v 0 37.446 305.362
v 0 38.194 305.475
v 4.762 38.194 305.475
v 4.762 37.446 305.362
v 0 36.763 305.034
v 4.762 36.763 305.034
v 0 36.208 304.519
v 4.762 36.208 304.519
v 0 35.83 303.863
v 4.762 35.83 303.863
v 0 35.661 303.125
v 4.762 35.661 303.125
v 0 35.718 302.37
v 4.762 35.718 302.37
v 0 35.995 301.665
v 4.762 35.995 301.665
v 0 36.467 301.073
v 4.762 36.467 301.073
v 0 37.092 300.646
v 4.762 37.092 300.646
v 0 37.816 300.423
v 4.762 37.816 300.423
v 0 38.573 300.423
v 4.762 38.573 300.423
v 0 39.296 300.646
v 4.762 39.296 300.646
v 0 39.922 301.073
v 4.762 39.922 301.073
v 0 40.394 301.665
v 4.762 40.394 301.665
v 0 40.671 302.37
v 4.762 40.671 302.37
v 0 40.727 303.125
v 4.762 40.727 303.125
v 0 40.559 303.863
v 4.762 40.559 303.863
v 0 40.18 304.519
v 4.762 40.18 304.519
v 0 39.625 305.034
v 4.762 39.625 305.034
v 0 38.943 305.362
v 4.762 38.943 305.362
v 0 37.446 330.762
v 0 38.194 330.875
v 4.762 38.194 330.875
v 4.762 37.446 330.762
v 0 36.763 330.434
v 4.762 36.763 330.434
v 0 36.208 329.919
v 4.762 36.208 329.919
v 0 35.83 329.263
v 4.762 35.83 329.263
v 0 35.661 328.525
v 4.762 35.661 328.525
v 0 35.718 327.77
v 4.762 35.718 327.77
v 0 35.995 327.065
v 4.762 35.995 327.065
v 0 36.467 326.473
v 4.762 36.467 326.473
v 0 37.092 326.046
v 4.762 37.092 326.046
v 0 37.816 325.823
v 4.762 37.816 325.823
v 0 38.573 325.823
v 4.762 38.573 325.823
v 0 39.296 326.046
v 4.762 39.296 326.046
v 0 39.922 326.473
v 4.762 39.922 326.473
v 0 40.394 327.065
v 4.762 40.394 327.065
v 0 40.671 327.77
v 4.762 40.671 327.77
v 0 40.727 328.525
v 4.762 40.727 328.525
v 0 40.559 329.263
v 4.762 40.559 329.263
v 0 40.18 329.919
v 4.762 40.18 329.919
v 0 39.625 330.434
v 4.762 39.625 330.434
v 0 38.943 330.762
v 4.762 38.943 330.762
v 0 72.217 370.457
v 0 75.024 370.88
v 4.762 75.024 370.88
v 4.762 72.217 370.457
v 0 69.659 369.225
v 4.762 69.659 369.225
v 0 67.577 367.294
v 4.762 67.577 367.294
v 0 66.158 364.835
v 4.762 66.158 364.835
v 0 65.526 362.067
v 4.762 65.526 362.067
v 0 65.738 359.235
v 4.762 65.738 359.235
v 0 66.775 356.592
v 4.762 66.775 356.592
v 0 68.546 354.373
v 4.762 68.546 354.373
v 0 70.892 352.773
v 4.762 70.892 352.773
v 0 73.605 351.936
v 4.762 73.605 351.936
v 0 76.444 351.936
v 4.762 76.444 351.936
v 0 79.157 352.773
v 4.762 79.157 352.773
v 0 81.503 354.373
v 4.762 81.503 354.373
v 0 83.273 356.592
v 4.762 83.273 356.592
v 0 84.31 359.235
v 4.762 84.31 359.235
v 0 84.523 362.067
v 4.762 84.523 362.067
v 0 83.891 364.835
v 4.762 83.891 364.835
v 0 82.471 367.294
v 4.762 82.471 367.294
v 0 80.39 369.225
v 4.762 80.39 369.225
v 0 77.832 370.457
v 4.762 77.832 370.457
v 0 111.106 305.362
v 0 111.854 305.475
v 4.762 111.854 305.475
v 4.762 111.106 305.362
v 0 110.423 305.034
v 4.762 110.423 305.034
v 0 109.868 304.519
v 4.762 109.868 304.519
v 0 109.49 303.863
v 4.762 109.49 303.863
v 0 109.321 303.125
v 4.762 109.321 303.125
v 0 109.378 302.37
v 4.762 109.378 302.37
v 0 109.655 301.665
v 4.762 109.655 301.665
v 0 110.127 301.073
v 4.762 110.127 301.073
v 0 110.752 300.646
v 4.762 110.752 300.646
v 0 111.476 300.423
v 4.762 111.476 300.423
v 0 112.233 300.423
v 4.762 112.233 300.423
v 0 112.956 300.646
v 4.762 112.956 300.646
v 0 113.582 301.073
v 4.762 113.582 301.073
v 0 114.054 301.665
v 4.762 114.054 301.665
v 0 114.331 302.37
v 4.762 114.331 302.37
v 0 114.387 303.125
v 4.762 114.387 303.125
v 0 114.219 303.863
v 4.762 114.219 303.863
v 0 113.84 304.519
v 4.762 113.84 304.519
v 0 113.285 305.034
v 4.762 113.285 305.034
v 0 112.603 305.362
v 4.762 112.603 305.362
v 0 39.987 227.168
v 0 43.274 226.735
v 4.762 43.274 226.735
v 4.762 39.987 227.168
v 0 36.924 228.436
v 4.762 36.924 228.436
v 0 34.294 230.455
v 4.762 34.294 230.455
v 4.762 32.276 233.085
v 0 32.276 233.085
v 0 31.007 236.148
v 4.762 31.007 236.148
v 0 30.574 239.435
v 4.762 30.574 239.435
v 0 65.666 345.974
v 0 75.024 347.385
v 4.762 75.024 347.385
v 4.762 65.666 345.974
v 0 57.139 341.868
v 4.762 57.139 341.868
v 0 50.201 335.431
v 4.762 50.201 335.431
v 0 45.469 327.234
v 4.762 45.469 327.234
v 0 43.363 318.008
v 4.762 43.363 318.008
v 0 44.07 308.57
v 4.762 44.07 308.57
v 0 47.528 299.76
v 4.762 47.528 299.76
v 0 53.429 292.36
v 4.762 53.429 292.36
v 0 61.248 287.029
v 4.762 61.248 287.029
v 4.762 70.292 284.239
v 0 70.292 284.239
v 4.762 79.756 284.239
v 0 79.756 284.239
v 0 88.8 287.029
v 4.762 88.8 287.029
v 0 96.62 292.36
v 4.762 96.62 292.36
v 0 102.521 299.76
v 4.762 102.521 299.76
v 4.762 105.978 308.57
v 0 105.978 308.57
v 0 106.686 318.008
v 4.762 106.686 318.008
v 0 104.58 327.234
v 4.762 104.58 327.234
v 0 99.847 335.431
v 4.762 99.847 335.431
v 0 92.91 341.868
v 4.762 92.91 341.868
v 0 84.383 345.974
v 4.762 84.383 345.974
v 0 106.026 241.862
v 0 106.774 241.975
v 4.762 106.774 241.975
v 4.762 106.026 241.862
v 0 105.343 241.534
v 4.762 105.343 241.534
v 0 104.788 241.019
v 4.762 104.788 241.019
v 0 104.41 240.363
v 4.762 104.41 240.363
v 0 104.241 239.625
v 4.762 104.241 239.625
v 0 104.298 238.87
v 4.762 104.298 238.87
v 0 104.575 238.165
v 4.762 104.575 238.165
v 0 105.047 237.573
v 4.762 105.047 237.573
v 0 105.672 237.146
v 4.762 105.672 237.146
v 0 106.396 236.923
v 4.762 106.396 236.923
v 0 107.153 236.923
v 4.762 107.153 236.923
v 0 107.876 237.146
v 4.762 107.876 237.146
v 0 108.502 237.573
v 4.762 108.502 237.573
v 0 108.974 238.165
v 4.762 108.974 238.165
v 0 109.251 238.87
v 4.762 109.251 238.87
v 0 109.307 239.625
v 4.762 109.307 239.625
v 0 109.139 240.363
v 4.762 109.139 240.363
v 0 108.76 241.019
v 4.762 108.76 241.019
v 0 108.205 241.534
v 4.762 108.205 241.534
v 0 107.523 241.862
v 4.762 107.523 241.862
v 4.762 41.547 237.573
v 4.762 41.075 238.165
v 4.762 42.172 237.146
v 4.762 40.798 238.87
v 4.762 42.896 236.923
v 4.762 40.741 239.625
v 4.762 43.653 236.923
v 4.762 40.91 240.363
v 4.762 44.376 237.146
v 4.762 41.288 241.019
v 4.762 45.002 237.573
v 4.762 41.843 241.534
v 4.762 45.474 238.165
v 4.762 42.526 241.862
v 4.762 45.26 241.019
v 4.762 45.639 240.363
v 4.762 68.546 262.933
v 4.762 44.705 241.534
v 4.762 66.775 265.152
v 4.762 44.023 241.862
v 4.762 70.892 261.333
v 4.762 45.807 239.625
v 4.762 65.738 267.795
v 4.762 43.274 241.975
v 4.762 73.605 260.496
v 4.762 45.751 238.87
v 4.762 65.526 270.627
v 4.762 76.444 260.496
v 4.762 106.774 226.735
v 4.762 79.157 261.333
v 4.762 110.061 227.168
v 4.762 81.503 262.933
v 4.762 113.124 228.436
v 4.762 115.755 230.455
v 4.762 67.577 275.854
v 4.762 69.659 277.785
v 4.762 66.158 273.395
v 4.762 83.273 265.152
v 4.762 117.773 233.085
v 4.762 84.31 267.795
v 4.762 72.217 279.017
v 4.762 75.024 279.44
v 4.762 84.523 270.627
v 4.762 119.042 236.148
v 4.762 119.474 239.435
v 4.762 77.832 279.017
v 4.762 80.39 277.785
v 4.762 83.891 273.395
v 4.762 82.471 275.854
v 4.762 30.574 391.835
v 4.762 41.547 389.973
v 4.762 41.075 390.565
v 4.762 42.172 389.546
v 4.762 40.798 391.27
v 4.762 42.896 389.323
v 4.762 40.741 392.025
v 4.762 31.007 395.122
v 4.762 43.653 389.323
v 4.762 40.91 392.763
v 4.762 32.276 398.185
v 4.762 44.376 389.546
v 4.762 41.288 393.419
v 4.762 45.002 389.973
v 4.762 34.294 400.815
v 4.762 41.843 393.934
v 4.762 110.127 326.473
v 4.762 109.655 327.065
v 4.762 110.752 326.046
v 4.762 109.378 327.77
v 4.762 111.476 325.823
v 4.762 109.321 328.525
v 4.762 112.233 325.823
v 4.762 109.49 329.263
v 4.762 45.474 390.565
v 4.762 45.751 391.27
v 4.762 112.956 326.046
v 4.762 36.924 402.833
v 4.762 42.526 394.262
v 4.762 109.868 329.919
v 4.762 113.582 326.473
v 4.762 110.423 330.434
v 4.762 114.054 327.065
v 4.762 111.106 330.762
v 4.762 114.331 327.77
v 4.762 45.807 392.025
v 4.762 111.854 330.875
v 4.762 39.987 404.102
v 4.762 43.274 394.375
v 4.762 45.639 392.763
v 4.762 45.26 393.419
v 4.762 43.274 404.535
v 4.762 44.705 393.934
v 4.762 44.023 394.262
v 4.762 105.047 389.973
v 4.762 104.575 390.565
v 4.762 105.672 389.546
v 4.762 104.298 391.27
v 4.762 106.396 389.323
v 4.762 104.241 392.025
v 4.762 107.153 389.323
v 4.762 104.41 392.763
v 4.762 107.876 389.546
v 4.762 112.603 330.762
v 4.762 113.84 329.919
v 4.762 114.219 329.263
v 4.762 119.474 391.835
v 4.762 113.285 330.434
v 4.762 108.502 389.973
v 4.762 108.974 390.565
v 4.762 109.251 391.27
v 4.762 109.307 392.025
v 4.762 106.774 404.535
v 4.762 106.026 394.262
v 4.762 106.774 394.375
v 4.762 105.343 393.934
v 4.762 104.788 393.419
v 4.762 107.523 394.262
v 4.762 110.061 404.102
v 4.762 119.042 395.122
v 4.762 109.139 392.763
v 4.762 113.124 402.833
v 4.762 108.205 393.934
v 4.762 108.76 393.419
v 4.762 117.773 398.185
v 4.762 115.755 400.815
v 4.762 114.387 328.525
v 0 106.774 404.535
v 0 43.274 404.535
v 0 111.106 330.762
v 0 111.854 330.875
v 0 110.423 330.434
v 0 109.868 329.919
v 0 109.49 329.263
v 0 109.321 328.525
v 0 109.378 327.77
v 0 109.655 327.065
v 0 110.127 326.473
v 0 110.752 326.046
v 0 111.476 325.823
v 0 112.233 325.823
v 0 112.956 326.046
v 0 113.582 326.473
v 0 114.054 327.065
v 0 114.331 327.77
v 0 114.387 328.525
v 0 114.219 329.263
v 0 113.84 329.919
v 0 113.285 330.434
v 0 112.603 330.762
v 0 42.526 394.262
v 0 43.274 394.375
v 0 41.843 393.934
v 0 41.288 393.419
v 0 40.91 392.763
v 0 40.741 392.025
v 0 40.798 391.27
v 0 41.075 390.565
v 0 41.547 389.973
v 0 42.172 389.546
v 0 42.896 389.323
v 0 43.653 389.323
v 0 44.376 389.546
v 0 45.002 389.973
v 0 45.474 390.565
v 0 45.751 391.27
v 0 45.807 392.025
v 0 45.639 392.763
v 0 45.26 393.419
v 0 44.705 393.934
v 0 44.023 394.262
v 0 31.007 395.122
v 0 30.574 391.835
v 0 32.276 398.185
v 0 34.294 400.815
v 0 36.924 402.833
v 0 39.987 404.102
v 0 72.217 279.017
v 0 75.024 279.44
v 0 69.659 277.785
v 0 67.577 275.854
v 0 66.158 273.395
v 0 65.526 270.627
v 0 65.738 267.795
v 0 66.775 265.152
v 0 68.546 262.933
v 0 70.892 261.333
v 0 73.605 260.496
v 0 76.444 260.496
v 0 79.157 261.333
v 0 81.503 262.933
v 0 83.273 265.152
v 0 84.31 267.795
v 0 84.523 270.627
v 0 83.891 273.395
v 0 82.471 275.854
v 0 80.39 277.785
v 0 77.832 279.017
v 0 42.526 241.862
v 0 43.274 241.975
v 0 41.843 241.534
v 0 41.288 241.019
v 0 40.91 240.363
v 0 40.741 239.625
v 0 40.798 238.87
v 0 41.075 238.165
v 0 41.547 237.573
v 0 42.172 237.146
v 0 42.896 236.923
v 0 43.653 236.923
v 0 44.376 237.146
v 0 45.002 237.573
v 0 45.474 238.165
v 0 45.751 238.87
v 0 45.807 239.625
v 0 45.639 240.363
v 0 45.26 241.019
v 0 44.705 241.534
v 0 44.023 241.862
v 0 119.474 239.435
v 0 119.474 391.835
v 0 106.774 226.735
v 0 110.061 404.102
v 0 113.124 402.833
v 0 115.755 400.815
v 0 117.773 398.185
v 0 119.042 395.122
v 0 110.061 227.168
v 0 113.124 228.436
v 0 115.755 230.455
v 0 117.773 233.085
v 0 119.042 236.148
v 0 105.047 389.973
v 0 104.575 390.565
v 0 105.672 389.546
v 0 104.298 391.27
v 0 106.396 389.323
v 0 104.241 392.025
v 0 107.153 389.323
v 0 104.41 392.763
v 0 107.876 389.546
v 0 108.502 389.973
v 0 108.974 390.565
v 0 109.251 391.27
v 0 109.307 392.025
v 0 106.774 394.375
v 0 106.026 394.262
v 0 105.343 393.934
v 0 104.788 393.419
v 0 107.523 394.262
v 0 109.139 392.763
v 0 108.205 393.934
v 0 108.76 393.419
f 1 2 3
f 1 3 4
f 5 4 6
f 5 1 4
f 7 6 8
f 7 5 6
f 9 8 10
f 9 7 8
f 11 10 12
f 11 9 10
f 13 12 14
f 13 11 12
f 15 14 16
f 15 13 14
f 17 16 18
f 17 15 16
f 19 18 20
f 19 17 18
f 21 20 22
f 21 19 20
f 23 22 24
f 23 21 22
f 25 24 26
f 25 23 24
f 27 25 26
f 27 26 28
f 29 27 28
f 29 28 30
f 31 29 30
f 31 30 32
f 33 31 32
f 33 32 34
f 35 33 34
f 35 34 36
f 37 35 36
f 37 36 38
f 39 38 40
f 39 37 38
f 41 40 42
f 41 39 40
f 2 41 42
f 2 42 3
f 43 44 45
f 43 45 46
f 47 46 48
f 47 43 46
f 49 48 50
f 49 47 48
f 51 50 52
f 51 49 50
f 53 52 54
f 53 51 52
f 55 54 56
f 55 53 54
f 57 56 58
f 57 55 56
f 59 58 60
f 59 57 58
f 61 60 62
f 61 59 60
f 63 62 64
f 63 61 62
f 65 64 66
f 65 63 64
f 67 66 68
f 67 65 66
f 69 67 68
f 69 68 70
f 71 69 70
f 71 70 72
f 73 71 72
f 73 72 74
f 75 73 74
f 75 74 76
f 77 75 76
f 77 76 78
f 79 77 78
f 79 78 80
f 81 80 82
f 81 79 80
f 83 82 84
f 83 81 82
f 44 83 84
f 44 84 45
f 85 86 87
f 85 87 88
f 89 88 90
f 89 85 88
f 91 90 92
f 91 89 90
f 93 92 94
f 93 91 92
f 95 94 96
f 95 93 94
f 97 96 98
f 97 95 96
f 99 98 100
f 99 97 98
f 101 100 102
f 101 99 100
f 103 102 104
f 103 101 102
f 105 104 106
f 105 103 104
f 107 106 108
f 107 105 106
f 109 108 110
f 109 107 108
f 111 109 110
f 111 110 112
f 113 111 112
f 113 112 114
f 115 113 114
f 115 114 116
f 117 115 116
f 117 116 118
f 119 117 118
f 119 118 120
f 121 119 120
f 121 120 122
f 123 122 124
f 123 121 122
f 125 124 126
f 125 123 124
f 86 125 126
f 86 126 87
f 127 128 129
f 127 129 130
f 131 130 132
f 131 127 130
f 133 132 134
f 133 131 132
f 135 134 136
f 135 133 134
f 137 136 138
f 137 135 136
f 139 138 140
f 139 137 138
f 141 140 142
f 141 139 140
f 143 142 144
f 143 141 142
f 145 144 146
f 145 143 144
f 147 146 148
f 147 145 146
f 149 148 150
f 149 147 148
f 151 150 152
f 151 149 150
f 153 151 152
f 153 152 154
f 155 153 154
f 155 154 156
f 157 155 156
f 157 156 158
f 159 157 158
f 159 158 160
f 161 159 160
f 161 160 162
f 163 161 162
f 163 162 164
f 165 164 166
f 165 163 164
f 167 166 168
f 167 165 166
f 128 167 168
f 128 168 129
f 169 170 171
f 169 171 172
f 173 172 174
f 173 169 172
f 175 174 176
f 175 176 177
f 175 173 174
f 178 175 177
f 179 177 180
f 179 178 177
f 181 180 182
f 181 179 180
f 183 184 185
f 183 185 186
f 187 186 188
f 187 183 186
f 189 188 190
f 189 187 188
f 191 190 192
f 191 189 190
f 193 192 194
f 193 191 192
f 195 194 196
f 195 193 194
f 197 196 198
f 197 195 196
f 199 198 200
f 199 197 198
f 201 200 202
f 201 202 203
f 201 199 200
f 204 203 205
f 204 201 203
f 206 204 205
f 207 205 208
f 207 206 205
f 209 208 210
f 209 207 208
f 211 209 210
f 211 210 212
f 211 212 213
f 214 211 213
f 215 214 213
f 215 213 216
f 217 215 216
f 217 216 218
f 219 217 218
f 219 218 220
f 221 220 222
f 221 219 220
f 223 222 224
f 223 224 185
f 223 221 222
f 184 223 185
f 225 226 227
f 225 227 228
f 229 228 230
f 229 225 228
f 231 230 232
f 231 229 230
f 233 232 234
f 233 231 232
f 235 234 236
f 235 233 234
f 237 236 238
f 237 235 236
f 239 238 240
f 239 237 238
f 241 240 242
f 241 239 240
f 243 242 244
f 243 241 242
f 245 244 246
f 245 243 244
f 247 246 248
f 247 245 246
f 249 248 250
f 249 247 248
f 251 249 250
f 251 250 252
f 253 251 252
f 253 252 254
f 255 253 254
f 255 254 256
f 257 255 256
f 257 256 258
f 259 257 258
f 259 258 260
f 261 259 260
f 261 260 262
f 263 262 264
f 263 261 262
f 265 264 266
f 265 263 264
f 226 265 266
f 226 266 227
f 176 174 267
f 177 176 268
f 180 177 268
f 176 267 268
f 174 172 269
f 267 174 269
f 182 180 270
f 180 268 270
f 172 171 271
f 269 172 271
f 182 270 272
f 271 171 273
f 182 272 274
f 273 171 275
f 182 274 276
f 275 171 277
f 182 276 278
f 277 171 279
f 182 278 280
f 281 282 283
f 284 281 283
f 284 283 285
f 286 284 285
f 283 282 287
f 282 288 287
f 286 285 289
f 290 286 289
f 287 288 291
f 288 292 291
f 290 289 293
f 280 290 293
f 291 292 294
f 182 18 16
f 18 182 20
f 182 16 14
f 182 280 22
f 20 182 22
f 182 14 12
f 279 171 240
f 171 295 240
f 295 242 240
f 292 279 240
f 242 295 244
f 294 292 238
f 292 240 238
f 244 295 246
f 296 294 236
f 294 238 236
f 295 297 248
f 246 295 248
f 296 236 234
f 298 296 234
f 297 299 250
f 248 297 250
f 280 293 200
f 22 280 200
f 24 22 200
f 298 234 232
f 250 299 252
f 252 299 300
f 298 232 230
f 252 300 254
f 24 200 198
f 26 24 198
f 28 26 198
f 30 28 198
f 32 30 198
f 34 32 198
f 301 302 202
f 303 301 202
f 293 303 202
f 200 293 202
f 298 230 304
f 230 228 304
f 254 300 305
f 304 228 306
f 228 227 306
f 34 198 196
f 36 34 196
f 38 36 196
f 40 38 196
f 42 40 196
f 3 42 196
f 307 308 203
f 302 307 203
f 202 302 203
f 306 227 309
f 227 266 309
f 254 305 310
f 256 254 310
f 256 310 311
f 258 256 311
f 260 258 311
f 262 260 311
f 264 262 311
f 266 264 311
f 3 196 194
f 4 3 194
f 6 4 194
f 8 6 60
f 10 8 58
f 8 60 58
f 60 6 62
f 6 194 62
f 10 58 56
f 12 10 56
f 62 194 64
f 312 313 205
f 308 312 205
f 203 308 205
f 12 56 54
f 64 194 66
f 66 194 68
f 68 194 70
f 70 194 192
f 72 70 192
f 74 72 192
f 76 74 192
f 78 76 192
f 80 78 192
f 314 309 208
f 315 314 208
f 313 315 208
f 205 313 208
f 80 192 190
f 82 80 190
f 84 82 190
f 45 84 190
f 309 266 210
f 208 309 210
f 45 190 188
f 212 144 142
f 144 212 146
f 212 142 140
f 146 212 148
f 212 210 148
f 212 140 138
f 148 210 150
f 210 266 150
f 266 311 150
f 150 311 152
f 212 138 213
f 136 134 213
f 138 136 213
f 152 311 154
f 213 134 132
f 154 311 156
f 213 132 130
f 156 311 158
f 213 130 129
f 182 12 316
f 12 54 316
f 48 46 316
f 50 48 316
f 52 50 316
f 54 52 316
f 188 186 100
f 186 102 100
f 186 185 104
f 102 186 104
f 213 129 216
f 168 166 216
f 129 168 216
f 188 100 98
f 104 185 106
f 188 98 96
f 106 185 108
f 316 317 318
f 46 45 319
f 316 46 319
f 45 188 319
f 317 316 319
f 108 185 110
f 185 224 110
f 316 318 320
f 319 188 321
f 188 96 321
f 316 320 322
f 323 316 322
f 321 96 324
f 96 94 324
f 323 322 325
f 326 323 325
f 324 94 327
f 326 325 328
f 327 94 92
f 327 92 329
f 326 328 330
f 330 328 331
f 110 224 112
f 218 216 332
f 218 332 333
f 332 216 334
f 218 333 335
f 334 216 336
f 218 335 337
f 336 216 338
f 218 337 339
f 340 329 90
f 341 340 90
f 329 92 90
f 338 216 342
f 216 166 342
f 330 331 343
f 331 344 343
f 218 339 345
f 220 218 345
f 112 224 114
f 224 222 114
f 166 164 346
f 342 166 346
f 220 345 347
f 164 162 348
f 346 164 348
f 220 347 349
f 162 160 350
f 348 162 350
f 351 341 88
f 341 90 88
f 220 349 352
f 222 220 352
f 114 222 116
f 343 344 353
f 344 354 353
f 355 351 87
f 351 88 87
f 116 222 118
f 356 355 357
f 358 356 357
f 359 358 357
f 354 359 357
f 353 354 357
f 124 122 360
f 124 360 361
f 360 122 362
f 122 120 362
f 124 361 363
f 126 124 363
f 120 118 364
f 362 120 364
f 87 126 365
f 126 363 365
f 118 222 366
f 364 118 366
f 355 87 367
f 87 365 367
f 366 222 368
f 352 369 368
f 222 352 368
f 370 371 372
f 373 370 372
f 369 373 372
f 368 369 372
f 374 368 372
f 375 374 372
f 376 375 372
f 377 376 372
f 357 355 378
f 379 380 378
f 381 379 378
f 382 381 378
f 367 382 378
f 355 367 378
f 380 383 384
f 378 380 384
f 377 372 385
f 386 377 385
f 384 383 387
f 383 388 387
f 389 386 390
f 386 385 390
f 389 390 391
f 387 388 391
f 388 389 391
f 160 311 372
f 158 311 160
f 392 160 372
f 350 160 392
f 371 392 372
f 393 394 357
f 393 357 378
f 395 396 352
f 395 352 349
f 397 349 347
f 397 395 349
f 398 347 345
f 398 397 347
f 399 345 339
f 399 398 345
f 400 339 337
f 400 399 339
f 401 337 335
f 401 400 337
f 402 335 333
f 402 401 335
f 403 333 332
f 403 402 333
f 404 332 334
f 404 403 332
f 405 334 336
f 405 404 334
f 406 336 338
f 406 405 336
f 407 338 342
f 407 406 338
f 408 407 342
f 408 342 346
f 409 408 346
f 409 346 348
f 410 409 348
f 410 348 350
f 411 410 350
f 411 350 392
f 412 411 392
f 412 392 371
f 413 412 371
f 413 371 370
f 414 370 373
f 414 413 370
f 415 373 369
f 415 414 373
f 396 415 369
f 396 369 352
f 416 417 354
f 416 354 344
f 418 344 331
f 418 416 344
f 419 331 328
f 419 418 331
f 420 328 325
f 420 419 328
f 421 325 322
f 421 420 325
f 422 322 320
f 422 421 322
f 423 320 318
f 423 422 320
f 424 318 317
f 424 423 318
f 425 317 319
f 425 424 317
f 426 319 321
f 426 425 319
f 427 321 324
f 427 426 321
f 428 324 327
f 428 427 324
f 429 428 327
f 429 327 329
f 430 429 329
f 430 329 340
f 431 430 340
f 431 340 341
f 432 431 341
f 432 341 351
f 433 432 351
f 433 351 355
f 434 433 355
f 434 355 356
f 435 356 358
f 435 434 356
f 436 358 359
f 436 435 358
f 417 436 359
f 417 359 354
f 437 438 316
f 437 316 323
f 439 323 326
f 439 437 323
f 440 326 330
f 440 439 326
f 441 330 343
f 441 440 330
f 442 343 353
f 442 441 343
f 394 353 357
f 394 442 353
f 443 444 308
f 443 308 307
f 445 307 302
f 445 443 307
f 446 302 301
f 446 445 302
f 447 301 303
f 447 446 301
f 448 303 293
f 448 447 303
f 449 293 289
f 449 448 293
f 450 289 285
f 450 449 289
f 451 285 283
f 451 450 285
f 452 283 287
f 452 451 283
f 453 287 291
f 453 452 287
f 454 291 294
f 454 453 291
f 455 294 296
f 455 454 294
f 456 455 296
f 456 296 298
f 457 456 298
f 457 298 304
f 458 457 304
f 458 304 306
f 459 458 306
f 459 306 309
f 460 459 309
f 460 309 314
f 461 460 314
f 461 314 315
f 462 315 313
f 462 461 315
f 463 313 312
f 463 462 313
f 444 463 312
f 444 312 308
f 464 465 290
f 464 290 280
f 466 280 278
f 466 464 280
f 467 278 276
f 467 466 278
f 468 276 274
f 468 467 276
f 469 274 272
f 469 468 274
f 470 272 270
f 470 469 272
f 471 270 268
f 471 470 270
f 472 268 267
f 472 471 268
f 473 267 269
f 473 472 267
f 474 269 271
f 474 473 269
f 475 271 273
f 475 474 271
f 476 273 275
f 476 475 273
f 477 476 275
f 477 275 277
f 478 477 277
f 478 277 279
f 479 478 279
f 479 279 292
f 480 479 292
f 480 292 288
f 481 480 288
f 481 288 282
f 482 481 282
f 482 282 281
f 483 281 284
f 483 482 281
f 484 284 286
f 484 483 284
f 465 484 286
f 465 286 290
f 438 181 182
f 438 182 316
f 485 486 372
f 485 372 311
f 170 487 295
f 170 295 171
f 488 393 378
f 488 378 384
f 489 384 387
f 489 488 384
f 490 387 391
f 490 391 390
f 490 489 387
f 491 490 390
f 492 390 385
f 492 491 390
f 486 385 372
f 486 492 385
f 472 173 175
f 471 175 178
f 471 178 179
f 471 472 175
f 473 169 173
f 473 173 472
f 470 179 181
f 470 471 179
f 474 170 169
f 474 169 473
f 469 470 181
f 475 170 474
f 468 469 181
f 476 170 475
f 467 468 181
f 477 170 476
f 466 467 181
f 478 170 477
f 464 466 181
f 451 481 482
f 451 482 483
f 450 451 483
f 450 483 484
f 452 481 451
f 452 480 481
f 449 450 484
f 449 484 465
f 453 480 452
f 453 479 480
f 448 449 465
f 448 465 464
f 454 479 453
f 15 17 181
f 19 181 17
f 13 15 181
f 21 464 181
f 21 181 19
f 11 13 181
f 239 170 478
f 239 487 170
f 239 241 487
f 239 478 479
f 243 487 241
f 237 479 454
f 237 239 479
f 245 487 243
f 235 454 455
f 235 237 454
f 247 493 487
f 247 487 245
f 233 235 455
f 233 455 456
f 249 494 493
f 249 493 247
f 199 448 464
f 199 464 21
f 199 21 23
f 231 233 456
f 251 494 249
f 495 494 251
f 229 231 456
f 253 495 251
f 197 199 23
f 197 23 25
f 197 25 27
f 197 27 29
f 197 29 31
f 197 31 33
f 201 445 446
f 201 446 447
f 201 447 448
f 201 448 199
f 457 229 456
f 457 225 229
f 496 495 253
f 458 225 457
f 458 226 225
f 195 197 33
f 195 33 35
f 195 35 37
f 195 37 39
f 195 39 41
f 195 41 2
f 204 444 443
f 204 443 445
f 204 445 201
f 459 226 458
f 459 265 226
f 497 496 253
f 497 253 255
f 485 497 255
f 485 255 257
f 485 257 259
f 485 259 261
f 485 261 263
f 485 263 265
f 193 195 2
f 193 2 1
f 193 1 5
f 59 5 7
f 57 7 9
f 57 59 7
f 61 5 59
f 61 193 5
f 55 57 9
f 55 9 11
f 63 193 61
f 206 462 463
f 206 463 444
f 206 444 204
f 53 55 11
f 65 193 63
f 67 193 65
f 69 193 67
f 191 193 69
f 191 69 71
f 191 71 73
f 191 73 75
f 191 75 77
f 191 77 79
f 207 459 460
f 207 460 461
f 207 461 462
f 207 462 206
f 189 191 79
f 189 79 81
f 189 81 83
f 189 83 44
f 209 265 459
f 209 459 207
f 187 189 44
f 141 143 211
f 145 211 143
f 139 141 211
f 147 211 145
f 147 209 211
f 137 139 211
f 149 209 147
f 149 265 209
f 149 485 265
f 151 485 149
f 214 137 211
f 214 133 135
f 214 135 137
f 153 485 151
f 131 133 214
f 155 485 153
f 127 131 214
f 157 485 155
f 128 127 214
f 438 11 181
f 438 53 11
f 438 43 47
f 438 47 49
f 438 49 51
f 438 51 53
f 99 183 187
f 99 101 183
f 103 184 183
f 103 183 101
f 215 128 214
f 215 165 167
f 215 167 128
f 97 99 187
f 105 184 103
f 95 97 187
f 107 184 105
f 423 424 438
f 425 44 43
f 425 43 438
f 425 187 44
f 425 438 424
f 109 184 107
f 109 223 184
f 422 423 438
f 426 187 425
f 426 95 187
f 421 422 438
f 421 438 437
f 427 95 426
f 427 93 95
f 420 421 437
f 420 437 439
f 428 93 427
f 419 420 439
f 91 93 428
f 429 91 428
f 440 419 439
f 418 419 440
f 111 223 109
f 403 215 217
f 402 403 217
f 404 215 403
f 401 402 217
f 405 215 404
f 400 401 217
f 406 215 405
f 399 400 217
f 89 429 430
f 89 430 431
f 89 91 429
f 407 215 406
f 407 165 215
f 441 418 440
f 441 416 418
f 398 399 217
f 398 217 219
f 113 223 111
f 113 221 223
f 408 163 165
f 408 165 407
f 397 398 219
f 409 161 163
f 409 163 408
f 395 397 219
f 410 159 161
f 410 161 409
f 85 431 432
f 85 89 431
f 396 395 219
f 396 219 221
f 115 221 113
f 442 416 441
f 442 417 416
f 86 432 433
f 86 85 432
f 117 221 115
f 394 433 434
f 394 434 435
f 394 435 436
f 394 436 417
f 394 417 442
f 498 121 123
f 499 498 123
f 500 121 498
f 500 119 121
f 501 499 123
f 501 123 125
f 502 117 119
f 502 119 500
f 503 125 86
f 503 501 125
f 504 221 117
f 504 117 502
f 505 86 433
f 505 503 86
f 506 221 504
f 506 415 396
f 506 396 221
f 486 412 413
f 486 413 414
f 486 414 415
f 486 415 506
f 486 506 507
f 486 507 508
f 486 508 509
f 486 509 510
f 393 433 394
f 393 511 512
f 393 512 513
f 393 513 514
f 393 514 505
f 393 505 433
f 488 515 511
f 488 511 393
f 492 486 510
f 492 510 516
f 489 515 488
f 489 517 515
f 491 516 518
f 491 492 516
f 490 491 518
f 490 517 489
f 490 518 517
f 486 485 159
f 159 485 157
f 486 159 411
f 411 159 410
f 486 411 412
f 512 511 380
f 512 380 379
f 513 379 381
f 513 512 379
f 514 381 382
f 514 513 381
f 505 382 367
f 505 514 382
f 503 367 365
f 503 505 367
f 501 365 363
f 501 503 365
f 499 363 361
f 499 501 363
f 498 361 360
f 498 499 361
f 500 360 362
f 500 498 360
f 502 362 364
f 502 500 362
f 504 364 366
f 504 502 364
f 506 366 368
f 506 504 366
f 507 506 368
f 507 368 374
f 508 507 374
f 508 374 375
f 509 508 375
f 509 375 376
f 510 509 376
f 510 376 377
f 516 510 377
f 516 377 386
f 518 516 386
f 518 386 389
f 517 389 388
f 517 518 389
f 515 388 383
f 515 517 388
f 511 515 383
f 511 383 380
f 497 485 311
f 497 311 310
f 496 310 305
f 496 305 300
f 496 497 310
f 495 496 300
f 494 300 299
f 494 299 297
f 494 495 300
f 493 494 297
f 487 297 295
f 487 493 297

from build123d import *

# Parameters (mm, degrees)
SKETCH1_R           = 2.54
SKETCH1_R_2         = 31.75
SKETCH1_R_3         = 9.525
BOSS_EXTRUDE1_DEPTH = 4.7625


with BuildPart() as part:
    # Sketch1 → Boss-Extrude1 (new body)
    with BuildSketch(Plane(origin=(0, 0, 0), x_dir=(0, 0, -1), z_dir=(1, 0, 0))):
        with BuildLine():
            Line((226.734866781, 43.274288567), (226.734866781, 106.774288567))
            ThreePointArc((226.734866781, 106.774288567), (230.45461066, 115.754544688), (239.434866781, 119.474288567))
            Line((239.434866781, 119.474288567), (391.834866781, 119.474288567))
            ThreePointArc((391.834866781, 119.474288567), (400.815122902, 115.754544688), (404.534866781, 106.774288567))
            Line((404.534866781, 106.774288567), (404.534866781, 43.274288567))
            ThreePointArc((404.534866781, 43.274288567), (400.815122902, 34.294032445), (391.834866781, 30.574288567))
            Line((391.834866781, 30.574288567), (239.434866781, 30.574288567))
            ThreePointArc((239.434866781, 30.574288567), (230.45461066, 34.294032445), (226.734866781, 43.274288567))
        make_face()
        with Locations(Location((302.934866781, 111.854288567, 0), (0, 0, 180))):
            Circle(SKETCH1_R, mode=Mode.SUBTRACT)
        with Locations(Location((328.334866781, 111.854288567, 0), (0, 0, 180))):
            Circle(SKETCH1_R, mode=Mode.SUBTRACT)
        with Locations(Location((302.934866781, 38.194288567, 0), (0, 0, 180))):
            Circle(SKETCH1_R, mode=Mode.SUBTRACT)
        with Locations(Location((328.334866781, 38.194288567, 0), (0, 0, 180))):
            Circle(SKETCH1_R, mode=Mode.SUBTRACT)
        with Locations(Location((239.434866781, 43.274288567, 0), (0, 0, 180))):
            Circle(SKETCH1_R, mode=Mode.SUBTRACT)
        with Locations(Location((391.834866781, 43.274288567, 0), (0, 0, 180))):
            Circle(SKETCH1_R, mode=Mode.SUBTRACT)
        with Locations(Location((315.634866781, 75.024288567, 0), (0, 0, 180))):
            Circle(SKETCH1_R_2, mode=Mode.SUBTRACT)
        with Locations(Location((239.434866781, 106.774288567, 0), (0, 0, 180))):
            Circle(SKETCH1_R, mode=Mode.SUBTRACT)
        with Locations(Location((391.834866781, 106.774288567, 0), (0, 0, 180))):
            Circle(SKETCH1_R, mode=Mode.SUBTRACT)
        with Locations(Location((269.914866781, 75.024288567, 0), (0, 0, 180))):
            Circle(SKETCH1_R_3, mode=Mode.SUBTRACT)
        with Locations(Location((361.354866781, 75.024288567, 0), (0, 0, 180))):
            Circle(SKETCH1_R_3, mode=Mode.SUBTRACT)
    extrude(amount=BOSS_EXTRUDE1_DEPTH)


with BuildPart() as part_1:
    # Body-Move/Copy1: moved
    add(part.part.moved(Location((0, 0, 631.269733563))))


solid = part_1.part
